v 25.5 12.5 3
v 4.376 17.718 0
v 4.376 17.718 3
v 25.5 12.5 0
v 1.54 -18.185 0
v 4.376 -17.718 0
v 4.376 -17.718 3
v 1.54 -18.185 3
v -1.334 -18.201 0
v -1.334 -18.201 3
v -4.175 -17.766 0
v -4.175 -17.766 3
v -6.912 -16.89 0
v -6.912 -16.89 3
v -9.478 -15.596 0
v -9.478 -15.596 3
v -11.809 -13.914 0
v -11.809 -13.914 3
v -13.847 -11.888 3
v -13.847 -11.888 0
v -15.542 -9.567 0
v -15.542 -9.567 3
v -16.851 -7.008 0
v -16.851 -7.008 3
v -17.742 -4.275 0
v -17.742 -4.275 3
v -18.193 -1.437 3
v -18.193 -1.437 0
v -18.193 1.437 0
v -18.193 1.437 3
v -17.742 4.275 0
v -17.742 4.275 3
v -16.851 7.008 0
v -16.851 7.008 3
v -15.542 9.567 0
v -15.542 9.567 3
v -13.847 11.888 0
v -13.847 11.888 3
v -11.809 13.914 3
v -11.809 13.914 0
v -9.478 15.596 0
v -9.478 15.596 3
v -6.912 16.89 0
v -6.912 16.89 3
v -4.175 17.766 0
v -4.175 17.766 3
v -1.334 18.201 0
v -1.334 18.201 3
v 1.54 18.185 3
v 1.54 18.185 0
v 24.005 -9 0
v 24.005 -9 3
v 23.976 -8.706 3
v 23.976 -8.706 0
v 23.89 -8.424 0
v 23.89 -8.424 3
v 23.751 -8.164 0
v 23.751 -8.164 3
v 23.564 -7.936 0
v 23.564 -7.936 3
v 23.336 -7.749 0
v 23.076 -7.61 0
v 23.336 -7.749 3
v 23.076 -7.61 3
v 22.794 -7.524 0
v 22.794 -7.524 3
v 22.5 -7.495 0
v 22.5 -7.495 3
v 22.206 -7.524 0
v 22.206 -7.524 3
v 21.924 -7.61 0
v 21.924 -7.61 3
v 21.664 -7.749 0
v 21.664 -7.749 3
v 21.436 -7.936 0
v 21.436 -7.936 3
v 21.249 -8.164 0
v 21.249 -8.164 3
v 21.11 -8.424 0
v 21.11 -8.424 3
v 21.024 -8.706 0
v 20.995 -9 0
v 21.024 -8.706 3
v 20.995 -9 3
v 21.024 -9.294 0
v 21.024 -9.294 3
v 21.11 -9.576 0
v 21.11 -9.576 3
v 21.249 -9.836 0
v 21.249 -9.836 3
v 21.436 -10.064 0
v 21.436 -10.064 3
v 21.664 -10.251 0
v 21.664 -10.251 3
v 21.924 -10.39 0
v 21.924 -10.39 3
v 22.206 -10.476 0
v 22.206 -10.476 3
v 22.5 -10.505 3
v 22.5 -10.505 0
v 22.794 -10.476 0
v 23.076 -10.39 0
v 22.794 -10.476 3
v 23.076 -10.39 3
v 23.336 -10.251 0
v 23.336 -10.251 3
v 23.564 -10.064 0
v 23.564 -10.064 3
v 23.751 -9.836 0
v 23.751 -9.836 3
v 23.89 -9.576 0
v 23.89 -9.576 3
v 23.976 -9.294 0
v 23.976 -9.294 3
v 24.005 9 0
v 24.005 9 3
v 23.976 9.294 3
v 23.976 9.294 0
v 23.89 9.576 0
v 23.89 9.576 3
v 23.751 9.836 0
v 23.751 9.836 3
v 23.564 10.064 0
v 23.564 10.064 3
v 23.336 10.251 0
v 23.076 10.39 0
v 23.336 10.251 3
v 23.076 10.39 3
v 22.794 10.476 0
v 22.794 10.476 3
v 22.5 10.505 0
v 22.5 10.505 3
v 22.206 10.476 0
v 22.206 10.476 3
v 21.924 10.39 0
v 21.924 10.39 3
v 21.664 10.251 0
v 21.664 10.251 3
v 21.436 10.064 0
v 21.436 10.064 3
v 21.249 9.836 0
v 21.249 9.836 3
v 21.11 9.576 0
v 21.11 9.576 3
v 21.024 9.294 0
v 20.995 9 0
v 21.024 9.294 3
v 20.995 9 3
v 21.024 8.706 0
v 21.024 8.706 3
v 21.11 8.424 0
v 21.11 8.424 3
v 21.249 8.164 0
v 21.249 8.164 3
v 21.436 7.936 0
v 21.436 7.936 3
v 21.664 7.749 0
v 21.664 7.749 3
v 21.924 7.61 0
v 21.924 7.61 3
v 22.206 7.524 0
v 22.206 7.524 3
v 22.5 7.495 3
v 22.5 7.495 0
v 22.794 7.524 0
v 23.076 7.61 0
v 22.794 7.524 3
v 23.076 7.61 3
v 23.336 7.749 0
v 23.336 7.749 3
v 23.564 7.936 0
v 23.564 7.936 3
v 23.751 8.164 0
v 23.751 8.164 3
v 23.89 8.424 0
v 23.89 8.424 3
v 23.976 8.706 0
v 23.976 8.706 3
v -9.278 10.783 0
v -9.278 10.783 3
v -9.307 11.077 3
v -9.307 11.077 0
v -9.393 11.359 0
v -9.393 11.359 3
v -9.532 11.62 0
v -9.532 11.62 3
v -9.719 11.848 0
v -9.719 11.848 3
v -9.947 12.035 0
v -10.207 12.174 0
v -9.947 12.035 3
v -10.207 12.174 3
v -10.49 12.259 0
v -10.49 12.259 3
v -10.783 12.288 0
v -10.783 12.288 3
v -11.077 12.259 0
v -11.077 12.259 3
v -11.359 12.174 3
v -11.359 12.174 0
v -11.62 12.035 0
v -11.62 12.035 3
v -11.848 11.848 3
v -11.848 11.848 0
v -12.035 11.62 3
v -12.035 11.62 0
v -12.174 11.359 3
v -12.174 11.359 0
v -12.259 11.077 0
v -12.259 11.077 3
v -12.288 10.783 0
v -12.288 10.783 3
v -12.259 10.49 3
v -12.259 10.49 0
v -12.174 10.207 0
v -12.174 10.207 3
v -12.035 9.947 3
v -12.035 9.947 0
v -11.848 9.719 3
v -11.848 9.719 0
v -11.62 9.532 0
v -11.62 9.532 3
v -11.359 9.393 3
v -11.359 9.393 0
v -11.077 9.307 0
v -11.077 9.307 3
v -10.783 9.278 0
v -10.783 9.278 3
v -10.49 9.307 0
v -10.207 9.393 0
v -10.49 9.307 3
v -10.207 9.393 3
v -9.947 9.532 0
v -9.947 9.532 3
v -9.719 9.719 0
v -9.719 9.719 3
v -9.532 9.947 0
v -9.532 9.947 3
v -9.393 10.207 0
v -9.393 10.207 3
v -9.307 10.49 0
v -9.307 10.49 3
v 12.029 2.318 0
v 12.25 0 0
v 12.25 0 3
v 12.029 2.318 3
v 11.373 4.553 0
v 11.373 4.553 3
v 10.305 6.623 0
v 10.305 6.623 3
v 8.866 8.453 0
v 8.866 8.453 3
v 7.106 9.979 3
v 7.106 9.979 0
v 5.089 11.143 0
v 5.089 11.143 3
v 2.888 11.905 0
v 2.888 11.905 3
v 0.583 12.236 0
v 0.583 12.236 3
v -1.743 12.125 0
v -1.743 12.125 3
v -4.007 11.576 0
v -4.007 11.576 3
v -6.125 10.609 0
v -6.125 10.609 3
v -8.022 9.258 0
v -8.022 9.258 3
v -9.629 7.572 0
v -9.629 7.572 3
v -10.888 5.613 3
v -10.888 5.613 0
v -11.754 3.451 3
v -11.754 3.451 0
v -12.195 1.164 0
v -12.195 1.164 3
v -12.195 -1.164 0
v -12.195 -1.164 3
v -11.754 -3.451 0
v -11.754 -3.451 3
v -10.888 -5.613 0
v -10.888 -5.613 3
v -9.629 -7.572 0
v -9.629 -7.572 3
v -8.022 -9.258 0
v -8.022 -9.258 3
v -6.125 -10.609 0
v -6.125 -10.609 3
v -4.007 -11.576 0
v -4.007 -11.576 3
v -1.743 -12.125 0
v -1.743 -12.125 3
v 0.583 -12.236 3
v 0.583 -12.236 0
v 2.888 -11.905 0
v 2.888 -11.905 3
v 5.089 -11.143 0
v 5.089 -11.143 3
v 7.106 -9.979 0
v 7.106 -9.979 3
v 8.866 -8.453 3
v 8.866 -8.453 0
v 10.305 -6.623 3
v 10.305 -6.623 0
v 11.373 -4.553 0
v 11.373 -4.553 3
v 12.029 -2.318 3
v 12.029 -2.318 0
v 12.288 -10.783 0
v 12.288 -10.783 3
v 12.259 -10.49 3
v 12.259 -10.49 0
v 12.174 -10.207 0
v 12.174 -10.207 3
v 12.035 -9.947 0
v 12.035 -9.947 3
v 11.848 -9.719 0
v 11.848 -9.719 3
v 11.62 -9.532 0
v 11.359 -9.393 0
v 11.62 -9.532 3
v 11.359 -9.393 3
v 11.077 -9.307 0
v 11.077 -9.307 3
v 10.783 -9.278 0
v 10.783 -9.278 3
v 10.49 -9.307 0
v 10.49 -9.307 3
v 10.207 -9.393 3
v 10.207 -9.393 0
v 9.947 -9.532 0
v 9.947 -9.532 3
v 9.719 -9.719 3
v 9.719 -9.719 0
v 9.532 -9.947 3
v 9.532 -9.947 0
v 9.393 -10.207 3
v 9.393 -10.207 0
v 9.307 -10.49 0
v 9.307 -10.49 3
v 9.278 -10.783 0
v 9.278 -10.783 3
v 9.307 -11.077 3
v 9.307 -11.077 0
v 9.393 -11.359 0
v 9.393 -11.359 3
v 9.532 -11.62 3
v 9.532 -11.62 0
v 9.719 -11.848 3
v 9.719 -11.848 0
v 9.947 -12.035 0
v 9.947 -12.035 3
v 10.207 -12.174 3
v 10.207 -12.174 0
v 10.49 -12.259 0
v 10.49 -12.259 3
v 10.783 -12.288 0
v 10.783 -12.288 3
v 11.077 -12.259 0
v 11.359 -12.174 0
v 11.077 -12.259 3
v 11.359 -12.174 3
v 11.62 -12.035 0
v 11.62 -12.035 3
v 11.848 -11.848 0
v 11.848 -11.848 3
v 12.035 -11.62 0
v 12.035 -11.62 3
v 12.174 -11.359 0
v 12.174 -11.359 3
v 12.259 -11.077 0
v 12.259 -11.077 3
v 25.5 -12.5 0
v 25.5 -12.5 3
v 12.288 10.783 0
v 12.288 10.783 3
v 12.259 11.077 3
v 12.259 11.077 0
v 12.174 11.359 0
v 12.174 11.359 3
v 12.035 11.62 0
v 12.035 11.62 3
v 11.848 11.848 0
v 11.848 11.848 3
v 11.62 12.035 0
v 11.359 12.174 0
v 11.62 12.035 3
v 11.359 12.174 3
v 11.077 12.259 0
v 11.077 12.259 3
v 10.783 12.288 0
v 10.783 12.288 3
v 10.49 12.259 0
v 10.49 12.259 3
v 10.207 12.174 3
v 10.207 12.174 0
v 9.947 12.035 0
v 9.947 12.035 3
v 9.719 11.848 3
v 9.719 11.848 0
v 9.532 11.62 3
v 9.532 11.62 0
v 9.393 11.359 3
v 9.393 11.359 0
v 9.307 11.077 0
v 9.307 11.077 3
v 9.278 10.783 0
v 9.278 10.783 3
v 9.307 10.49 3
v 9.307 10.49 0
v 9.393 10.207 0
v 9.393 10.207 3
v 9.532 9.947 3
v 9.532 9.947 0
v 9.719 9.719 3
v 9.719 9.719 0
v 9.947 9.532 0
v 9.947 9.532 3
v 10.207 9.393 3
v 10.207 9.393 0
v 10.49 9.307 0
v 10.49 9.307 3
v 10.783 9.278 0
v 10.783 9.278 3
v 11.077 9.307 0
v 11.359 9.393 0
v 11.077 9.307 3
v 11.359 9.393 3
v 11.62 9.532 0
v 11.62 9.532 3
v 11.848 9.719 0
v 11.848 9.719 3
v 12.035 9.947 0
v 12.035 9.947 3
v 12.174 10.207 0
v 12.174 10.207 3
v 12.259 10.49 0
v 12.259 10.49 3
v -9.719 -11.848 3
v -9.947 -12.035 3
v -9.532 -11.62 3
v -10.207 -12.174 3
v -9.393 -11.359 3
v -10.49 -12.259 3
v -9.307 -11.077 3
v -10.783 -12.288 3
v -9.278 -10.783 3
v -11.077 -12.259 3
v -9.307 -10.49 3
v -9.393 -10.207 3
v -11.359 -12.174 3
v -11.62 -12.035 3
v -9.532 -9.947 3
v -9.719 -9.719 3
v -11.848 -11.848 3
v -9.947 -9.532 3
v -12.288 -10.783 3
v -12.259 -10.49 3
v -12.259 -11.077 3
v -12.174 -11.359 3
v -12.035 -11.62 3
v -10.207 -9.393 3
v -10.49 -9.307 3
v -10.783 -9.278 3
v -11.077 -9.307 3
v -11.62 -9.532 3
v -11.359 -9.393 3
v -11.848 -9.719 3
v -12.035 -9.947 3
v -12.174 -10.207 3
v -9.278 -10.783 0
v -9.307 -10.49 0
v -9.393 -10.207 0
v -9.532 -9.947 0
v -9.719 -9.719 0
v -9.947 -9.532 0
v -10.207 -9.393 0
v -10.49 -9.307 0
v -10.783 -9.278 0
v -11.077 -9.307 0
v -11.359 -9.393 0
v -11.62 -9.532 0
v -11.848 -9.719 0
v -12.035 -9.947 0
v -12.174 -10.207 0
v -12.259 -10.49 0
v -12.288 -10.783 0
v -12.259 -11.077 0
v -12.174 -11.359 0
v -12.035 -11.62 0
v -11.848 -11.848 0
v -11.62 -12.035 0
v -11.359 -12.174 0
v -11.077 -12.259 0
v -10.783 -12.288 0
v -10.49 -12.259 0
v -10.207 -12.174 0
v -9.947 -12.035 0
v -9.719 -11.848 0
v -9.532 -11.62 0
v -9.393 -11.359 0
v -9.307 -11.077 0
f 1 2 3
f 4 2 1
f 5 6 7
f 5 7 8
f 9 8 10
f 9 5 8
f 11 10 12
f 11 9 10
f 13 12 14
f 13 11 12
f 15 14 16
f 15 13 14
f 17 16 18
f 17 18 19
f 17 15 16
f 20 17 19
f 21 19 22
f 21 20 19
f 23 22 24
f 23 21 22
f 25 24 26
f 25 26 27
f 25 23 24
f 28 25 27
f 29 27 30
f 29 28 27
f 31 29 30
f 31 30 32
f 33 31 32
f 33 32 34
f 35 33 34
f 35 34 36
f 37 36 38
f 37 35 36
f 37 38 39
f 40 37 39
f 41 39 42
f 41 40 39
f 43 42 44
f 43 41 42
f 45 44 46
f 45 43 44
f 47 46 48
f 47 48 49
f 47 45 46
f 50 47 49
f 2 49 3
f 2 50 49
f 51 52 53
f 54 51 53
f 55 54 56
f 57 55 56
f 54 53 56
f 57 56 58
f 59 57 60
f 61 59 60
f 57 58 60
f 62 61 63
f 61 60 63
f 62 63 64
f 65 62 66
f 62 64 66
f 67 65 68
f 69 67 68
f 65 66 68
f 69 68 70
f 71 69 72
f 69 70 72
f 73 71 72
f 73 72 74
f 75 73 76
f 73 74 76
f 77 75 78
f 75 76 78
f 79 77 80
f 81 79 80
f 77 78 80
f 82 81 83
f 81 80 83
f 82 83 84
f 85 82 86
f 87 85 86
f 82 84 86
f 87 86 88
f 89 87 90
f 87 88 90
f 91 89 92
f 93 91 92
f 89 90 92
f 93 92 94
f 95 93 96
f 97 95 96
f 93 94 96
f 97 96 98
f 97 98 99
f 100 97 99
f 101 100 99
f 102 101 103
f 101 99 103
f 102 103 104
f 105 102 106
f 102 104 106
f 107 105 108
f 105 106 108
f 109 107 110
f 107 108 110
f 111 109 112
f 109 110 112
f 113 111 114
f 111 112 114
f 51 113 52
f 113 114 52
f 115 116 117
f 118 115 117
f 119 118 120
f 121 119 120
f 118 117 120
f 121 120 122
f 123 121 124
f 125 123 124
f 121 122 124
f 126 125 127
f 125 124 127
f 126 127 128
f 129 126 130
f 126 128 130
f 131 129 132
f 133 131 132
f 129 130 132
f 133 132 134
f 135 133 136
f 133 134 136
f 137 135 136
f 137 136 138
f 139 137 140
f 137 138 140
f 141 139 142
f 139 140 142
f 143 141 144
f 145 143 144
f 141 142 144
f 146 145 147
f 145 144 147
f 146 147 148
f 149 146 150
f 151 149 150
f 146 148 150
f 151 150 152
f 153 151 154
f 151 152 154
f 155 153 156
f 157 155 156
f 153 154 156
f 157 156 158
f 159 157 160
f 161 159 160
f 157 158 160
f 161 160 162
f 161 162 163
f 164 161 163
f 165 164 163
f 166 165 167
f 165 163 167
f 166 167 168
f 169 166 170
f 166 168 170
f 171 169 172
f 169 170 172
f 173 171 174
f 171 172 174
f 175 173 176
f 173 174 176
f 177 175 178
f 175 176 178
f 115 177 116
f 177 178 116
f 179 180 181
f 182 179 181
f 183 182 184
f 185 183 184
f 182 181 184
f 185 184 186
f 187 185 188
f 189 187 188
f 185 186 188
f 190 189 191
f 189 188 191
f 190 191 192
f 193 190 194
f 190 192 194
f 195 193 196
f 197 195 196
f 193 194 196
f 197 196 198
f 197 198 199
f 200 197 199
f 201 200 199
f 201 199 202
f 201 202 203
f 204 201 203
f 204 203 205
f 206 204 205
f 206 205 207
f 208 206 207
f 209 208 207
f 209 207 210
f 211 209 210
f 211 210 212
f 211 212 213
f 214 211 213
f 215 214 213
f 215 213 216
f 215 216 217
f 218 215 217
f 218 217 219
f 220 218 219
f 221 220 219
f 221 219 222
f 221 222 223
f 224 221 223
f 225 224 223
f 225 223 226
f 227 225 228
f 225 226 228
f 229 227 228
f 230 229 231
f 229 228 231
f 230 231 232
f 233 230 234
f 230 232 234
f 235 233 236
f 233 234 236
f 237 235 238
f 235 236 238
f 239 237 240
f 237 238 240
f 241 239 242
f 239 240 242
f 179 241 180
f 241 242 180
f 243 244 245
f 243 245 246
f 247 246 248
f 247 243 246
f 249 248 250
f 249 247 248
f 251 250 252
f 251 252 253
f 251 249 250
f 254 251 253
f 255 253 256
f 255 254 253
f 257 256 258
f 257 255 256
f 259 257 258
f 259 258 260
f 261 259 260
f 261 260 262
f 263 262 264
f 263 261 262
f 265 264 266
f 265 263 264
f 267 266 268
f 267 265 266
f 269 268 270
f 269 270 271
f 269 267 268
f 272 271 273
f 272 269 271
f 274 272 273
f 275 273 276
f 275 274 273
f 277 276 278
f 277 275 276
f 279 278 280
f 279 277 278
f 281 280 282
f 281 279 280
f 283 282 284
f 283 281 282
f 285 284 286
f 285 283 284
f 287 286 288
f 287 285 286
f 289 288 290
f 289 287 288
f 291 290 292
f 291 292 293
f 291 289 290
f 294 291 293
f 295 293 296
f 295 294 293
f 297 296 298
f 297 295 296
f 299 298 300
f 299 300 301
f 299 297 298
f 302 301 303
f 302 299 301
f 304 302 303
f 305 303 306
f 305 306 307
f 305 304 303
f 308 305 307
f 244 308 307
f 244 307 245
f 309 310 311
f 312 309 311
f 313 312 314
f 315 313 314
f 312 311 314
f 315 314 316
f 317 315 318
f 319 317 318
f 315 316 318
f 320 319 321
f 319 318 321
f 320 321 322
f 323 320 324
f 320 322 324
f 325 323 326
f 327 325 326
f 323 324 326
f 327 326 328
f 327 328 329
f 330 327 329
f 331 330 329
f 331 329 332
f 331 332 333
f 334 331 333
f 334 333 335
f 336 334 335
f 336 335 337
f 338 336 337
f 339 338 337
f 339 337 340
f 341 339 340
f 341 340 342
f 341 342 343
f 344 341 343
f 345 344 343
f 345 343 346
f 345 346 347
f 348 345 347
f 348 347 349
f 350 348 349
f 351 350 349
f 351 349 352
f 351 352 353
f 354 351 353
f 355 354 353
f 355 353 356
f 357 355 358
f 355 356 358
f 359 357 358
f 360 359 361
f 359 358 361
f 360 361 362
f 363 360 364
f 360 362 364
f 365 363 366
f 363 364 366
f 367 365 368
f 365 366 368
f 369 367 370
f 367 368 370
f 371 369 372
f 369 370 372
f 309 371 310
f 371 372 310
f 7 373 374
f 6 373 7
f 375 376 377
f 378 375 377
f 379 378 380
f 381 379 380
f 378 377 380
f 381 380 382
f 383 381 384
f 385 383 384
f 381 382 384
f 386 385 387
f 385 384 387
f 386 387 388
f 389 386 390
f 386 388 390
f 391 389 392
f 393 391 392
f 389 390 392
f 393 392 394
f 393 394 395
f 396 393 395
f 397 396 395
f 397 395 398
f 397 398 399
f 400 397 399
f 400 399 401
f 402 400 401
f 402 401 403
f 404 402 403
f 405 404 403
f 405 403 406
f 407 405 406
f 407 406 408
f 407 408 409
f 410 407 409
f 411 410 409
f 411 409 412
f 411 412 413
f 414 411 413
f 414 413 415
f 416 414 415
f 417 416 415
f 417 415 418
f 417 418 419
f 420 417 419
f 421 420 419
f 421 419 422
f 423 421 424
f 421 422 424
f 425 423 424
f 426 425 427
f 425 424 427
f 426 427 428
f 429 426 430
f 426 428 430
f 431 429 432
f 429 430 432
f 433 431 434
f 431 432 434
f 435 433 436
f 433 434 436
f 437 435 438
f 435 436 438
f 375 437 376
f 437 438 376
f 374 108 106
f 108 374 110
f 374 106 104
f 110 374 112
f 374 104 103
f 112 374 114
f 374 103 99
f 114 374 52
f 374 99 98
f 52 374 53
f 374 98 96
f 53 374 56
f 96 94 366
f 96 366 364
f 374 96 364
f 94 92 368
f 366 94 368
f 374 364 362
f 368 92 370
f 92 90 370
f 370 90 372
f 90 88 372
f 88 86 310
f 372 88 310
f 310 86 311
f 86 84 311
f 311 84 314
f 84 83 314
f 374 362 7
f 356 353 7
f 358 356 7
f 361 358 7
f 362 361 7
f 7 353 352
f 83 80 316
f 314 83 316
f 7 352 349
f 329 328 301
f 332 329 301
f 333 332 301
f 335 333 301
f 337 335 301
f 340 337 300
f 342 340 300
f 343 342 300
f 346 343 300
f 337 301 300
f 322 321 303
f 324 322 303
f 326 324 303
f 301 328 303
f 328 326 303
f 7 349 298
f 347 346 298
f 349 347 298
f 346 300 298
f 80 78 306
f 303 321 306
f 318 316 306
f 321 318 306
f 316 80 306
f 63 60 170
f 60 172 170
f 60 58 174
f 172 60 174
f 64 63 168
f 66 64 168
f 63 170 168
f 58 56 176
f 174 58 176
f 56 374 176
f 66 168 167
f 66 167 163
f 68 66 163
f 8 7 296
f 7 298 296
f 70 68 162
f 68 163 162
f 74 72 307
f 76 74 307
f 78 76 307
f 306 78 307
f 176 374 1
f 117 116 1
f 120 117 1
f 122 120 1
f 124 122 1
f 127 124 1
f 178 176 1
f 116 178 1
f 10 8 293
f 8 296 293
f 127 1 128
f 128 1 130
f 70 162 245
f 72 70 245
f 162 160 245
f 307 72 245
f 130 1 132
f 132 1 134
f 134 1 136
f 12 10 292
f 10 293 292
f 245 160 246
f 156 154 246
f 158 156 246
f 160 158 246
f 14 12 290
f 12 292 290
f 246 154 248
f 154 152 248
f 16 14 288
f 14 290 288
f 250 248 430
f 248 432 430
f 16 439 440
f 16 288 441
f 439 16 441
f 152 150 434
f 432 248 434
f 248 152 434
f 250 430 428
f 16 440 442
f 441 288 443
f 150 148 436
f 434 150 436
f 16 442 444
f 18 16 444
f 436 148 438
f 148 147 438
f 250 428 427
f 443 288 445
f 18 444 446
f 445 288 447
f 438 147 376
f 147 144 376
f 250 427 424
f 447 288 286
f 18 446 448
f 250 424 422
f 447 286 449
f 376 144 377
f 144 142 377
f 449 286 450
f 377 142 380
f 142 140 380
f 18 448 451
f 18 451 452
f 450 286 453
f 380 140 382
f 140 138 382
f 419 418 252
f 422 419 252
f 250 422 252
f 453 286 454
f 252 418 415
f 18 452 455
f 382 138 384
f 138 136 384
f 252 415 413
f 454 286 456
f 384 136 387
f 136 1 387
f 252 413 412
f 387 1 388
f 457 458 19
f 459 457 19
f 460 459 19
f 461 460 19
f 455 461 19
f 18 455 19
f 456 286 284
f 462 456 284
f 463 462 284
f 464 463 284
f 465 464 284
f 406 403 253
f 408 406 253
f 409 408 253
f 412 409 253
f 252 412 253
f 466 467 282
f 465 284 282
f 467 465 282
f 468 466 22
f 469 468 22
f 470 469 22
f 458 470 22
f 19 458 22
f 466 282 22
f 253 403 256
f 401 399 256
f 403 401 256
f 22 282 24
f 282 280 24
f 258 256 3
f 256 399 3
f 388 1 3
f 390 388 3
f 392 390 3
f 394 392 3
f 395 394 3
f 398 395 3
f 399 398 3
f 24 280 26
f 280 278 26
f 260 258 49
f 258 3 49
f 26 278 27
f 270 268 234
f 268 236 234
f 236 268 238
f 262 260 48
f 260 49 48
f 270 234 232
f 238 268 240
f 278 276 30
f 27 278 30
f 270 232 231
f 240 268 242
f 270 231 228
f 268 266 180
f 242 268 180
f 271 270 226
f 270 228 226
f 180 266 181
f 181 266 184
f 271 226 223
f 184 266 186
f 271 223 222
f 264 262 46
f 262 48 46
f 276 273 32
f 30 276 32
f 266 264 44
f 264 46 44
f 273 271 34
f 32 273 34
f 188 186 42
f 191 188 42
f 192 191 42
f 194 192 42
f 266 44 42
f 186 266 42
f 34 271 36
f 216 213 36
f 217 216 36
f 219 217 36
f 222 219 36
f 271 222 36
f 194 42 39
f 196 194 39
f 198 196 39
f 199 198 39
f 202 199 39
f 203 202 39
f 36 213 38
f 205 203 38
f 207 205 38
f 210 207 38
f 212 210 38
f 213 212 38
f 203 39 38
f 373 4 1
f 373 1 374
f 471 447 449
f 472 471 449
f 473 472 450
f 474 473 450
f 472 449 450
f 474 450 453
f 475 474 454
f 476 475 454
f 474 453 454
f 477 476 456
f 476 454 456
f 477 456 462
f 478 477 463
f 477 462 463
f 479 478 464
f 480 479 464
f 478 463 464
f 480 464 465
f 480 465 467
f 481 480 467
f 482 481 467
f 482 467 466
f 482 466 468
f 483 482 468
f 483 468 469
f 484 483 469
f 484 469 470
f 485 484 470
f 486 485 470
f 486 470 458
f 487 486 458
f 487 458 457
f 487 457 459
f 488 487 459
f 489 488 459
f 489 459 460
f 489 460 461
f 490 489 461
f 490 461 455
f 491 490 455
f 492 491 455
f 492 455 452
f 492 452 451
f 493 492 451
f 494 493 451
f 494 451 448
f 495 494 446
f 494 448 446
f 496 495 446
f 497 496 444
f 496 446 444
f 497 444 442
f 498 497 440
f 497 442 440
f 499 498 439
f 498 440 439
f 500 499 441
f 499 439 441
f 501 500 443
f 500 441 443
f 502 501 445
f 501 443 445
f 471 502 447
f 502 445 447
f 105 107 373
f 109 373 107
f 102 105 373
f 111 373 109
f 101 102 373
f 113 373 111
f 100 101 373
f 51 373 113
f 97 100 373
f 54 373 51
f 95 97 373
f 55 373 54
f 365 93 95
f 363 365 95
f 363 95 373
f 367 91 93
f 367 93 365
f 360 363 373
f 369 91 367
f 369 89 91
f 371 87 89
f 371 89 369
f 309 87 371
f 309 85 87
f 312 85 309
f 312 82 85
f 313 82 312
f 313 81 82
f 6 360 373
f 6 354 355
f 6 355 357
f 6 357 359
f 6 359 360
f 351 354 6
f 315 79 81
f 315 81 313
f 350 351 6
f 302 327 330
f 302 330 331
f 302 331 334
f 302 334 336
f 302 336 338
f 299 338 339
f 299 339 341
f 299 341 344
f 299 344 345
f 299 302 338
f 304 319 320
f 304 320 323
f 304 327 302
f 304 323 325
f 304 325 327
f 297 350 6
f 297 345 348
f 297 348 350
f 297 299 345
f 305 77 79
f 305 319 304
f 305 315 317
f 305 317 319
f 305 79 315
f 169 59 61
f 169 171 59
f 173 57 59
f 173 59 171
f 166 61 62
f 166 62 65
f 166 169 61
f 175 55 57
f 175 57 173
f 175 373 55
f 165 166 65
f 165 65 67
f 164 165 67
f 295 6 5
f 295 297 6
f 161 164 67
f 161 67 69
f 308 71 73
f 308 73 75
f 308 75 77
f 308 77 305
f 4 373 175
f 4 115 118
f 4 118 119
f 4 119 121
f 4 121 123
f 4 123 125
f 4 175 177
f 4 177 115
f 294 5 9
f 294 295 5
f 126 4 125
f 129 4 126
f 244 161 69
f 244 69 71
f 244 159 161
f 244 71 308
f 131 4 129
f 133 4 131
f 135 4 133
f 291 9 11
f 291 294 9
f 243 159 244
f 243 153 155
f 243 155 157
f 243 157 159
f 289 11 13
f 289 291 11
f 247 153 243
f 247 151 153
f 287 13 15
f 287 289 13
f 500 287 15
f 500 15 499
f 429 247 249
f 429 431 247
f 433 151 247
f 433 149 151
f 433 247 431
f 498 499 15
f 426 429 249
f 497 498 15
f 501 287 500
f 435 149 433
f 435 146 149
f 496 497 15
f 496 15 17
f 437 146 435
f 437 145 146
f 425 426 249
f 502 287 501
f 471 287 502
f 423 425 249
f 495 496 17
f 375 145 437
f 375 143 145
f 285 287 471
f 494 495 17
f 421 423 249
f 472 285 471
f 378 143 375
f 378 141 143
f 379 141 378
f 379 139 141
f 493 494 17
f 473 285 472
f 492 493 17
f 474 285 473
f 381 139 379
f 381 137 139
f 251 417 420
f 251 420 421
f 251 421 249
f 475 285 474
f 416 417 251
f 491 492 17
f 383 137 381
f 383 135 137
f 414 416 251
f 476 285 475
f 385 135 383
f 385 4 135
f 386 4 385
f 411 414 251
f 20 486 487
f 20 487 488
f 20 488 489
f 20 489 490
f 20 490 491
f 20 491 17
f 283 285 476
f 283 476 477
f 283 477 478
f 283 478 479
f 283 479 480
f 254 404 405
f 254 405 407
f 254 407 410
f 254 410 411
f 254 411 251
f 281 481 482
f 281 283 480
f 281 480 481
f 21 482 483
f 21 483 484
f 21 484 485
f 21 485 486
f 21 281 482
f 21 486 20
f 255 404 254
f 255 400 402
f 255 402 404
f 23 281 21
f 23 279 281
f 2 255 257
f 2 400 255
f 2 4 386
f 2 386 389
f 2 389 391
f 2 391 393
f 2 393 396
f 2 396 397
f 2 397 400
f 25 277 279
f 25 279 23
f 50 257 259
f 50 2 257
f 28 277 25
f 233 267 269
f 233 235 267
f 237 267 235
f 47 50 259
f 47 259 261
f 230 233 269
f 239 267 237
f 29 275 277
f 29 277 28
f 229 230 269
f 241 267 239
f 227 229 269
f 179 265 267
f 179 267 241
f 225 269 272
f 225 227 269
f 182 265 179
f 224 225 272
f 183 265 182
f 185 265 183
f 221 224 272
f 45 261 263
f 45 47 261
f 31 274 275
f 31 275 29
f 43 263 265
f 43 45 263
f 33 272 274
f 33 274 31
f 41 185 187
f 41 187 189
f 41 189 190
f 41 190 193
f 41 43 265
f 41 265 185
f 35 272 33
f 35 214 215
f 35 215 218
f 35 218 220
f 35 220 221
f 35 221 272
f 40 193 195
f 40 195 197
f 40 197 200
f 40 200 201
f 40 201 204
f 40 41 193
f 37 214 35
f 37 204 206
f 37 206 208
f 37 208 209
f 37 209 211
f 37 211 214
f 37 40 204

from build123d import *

# Parameters (mm, degrees)
SKETCH_1_R          = 12.25
EXTRUDE_1_DEPTH     = 3
SKETCH_2_R          = 1.505
CUT_EXTRUDE_1_DEPTH = 32
SKETCH_4_R          = 1.505
CUT_EXTRUDE_2_DEPTH = 3


with BuildPart() as part:
    # 草图1 → 凸台-拉伸1 (new body)
    with BuildSketch(Plane.XY):
        with BuildLine():
            Line((25.5, 12.5), (25.5, -12.5))
            Line((25.5, -12.5), (4.376204333, -17.71754316))
            ThreePointArc((4.376204333, -17.71754316), (-18.25, 0), (4.376204333, 17.71754316))
            Line((4.376204333, 17.71754316), (25.5, 12.5))
        make_face()
        Circle(SKETCH_1_R, mode=Mode.SUBTRACT)
    extrude(amount=EXTRUDE_1_DEPTH)

    # 草图2 → 切除-拉伸1 (cut)
    with BuildSketch(Plane.XY.offset(3)):
        with Locations((-10.783378413, 10.783378413)):
            Circle(SKETCH_2_R)
        with Locations((10.783378413, 10.783378413)):
            Circle(SKETCH_2_R)
        with Locations((10.783378413, -10.783378413)):
            Circle(SKETCH_2_R)
        with Locations((-10.783378413, -10.783378413)):
            Circle(SKETCH_2_R)
    extrude(amount=-CUT_EXTRUDE_1_DEPTH, mode=Mode.SUBTRACT)

    # 草图4 → 切除-拉伸2 (cut, symmetric)
    with BuildSketch(Plane.XY.offset(3)):
        with Locations((22.5, -9)):
            Circle(SKETCH_4_R)
        with Locations((22.5, 9)):
            Circle(SKETCH_4_R)
    extrude(amount=CUT_EXTRUDE_2_DEPTH, both=True, mode=Mode.SUBTRACT)


solid = part.part
